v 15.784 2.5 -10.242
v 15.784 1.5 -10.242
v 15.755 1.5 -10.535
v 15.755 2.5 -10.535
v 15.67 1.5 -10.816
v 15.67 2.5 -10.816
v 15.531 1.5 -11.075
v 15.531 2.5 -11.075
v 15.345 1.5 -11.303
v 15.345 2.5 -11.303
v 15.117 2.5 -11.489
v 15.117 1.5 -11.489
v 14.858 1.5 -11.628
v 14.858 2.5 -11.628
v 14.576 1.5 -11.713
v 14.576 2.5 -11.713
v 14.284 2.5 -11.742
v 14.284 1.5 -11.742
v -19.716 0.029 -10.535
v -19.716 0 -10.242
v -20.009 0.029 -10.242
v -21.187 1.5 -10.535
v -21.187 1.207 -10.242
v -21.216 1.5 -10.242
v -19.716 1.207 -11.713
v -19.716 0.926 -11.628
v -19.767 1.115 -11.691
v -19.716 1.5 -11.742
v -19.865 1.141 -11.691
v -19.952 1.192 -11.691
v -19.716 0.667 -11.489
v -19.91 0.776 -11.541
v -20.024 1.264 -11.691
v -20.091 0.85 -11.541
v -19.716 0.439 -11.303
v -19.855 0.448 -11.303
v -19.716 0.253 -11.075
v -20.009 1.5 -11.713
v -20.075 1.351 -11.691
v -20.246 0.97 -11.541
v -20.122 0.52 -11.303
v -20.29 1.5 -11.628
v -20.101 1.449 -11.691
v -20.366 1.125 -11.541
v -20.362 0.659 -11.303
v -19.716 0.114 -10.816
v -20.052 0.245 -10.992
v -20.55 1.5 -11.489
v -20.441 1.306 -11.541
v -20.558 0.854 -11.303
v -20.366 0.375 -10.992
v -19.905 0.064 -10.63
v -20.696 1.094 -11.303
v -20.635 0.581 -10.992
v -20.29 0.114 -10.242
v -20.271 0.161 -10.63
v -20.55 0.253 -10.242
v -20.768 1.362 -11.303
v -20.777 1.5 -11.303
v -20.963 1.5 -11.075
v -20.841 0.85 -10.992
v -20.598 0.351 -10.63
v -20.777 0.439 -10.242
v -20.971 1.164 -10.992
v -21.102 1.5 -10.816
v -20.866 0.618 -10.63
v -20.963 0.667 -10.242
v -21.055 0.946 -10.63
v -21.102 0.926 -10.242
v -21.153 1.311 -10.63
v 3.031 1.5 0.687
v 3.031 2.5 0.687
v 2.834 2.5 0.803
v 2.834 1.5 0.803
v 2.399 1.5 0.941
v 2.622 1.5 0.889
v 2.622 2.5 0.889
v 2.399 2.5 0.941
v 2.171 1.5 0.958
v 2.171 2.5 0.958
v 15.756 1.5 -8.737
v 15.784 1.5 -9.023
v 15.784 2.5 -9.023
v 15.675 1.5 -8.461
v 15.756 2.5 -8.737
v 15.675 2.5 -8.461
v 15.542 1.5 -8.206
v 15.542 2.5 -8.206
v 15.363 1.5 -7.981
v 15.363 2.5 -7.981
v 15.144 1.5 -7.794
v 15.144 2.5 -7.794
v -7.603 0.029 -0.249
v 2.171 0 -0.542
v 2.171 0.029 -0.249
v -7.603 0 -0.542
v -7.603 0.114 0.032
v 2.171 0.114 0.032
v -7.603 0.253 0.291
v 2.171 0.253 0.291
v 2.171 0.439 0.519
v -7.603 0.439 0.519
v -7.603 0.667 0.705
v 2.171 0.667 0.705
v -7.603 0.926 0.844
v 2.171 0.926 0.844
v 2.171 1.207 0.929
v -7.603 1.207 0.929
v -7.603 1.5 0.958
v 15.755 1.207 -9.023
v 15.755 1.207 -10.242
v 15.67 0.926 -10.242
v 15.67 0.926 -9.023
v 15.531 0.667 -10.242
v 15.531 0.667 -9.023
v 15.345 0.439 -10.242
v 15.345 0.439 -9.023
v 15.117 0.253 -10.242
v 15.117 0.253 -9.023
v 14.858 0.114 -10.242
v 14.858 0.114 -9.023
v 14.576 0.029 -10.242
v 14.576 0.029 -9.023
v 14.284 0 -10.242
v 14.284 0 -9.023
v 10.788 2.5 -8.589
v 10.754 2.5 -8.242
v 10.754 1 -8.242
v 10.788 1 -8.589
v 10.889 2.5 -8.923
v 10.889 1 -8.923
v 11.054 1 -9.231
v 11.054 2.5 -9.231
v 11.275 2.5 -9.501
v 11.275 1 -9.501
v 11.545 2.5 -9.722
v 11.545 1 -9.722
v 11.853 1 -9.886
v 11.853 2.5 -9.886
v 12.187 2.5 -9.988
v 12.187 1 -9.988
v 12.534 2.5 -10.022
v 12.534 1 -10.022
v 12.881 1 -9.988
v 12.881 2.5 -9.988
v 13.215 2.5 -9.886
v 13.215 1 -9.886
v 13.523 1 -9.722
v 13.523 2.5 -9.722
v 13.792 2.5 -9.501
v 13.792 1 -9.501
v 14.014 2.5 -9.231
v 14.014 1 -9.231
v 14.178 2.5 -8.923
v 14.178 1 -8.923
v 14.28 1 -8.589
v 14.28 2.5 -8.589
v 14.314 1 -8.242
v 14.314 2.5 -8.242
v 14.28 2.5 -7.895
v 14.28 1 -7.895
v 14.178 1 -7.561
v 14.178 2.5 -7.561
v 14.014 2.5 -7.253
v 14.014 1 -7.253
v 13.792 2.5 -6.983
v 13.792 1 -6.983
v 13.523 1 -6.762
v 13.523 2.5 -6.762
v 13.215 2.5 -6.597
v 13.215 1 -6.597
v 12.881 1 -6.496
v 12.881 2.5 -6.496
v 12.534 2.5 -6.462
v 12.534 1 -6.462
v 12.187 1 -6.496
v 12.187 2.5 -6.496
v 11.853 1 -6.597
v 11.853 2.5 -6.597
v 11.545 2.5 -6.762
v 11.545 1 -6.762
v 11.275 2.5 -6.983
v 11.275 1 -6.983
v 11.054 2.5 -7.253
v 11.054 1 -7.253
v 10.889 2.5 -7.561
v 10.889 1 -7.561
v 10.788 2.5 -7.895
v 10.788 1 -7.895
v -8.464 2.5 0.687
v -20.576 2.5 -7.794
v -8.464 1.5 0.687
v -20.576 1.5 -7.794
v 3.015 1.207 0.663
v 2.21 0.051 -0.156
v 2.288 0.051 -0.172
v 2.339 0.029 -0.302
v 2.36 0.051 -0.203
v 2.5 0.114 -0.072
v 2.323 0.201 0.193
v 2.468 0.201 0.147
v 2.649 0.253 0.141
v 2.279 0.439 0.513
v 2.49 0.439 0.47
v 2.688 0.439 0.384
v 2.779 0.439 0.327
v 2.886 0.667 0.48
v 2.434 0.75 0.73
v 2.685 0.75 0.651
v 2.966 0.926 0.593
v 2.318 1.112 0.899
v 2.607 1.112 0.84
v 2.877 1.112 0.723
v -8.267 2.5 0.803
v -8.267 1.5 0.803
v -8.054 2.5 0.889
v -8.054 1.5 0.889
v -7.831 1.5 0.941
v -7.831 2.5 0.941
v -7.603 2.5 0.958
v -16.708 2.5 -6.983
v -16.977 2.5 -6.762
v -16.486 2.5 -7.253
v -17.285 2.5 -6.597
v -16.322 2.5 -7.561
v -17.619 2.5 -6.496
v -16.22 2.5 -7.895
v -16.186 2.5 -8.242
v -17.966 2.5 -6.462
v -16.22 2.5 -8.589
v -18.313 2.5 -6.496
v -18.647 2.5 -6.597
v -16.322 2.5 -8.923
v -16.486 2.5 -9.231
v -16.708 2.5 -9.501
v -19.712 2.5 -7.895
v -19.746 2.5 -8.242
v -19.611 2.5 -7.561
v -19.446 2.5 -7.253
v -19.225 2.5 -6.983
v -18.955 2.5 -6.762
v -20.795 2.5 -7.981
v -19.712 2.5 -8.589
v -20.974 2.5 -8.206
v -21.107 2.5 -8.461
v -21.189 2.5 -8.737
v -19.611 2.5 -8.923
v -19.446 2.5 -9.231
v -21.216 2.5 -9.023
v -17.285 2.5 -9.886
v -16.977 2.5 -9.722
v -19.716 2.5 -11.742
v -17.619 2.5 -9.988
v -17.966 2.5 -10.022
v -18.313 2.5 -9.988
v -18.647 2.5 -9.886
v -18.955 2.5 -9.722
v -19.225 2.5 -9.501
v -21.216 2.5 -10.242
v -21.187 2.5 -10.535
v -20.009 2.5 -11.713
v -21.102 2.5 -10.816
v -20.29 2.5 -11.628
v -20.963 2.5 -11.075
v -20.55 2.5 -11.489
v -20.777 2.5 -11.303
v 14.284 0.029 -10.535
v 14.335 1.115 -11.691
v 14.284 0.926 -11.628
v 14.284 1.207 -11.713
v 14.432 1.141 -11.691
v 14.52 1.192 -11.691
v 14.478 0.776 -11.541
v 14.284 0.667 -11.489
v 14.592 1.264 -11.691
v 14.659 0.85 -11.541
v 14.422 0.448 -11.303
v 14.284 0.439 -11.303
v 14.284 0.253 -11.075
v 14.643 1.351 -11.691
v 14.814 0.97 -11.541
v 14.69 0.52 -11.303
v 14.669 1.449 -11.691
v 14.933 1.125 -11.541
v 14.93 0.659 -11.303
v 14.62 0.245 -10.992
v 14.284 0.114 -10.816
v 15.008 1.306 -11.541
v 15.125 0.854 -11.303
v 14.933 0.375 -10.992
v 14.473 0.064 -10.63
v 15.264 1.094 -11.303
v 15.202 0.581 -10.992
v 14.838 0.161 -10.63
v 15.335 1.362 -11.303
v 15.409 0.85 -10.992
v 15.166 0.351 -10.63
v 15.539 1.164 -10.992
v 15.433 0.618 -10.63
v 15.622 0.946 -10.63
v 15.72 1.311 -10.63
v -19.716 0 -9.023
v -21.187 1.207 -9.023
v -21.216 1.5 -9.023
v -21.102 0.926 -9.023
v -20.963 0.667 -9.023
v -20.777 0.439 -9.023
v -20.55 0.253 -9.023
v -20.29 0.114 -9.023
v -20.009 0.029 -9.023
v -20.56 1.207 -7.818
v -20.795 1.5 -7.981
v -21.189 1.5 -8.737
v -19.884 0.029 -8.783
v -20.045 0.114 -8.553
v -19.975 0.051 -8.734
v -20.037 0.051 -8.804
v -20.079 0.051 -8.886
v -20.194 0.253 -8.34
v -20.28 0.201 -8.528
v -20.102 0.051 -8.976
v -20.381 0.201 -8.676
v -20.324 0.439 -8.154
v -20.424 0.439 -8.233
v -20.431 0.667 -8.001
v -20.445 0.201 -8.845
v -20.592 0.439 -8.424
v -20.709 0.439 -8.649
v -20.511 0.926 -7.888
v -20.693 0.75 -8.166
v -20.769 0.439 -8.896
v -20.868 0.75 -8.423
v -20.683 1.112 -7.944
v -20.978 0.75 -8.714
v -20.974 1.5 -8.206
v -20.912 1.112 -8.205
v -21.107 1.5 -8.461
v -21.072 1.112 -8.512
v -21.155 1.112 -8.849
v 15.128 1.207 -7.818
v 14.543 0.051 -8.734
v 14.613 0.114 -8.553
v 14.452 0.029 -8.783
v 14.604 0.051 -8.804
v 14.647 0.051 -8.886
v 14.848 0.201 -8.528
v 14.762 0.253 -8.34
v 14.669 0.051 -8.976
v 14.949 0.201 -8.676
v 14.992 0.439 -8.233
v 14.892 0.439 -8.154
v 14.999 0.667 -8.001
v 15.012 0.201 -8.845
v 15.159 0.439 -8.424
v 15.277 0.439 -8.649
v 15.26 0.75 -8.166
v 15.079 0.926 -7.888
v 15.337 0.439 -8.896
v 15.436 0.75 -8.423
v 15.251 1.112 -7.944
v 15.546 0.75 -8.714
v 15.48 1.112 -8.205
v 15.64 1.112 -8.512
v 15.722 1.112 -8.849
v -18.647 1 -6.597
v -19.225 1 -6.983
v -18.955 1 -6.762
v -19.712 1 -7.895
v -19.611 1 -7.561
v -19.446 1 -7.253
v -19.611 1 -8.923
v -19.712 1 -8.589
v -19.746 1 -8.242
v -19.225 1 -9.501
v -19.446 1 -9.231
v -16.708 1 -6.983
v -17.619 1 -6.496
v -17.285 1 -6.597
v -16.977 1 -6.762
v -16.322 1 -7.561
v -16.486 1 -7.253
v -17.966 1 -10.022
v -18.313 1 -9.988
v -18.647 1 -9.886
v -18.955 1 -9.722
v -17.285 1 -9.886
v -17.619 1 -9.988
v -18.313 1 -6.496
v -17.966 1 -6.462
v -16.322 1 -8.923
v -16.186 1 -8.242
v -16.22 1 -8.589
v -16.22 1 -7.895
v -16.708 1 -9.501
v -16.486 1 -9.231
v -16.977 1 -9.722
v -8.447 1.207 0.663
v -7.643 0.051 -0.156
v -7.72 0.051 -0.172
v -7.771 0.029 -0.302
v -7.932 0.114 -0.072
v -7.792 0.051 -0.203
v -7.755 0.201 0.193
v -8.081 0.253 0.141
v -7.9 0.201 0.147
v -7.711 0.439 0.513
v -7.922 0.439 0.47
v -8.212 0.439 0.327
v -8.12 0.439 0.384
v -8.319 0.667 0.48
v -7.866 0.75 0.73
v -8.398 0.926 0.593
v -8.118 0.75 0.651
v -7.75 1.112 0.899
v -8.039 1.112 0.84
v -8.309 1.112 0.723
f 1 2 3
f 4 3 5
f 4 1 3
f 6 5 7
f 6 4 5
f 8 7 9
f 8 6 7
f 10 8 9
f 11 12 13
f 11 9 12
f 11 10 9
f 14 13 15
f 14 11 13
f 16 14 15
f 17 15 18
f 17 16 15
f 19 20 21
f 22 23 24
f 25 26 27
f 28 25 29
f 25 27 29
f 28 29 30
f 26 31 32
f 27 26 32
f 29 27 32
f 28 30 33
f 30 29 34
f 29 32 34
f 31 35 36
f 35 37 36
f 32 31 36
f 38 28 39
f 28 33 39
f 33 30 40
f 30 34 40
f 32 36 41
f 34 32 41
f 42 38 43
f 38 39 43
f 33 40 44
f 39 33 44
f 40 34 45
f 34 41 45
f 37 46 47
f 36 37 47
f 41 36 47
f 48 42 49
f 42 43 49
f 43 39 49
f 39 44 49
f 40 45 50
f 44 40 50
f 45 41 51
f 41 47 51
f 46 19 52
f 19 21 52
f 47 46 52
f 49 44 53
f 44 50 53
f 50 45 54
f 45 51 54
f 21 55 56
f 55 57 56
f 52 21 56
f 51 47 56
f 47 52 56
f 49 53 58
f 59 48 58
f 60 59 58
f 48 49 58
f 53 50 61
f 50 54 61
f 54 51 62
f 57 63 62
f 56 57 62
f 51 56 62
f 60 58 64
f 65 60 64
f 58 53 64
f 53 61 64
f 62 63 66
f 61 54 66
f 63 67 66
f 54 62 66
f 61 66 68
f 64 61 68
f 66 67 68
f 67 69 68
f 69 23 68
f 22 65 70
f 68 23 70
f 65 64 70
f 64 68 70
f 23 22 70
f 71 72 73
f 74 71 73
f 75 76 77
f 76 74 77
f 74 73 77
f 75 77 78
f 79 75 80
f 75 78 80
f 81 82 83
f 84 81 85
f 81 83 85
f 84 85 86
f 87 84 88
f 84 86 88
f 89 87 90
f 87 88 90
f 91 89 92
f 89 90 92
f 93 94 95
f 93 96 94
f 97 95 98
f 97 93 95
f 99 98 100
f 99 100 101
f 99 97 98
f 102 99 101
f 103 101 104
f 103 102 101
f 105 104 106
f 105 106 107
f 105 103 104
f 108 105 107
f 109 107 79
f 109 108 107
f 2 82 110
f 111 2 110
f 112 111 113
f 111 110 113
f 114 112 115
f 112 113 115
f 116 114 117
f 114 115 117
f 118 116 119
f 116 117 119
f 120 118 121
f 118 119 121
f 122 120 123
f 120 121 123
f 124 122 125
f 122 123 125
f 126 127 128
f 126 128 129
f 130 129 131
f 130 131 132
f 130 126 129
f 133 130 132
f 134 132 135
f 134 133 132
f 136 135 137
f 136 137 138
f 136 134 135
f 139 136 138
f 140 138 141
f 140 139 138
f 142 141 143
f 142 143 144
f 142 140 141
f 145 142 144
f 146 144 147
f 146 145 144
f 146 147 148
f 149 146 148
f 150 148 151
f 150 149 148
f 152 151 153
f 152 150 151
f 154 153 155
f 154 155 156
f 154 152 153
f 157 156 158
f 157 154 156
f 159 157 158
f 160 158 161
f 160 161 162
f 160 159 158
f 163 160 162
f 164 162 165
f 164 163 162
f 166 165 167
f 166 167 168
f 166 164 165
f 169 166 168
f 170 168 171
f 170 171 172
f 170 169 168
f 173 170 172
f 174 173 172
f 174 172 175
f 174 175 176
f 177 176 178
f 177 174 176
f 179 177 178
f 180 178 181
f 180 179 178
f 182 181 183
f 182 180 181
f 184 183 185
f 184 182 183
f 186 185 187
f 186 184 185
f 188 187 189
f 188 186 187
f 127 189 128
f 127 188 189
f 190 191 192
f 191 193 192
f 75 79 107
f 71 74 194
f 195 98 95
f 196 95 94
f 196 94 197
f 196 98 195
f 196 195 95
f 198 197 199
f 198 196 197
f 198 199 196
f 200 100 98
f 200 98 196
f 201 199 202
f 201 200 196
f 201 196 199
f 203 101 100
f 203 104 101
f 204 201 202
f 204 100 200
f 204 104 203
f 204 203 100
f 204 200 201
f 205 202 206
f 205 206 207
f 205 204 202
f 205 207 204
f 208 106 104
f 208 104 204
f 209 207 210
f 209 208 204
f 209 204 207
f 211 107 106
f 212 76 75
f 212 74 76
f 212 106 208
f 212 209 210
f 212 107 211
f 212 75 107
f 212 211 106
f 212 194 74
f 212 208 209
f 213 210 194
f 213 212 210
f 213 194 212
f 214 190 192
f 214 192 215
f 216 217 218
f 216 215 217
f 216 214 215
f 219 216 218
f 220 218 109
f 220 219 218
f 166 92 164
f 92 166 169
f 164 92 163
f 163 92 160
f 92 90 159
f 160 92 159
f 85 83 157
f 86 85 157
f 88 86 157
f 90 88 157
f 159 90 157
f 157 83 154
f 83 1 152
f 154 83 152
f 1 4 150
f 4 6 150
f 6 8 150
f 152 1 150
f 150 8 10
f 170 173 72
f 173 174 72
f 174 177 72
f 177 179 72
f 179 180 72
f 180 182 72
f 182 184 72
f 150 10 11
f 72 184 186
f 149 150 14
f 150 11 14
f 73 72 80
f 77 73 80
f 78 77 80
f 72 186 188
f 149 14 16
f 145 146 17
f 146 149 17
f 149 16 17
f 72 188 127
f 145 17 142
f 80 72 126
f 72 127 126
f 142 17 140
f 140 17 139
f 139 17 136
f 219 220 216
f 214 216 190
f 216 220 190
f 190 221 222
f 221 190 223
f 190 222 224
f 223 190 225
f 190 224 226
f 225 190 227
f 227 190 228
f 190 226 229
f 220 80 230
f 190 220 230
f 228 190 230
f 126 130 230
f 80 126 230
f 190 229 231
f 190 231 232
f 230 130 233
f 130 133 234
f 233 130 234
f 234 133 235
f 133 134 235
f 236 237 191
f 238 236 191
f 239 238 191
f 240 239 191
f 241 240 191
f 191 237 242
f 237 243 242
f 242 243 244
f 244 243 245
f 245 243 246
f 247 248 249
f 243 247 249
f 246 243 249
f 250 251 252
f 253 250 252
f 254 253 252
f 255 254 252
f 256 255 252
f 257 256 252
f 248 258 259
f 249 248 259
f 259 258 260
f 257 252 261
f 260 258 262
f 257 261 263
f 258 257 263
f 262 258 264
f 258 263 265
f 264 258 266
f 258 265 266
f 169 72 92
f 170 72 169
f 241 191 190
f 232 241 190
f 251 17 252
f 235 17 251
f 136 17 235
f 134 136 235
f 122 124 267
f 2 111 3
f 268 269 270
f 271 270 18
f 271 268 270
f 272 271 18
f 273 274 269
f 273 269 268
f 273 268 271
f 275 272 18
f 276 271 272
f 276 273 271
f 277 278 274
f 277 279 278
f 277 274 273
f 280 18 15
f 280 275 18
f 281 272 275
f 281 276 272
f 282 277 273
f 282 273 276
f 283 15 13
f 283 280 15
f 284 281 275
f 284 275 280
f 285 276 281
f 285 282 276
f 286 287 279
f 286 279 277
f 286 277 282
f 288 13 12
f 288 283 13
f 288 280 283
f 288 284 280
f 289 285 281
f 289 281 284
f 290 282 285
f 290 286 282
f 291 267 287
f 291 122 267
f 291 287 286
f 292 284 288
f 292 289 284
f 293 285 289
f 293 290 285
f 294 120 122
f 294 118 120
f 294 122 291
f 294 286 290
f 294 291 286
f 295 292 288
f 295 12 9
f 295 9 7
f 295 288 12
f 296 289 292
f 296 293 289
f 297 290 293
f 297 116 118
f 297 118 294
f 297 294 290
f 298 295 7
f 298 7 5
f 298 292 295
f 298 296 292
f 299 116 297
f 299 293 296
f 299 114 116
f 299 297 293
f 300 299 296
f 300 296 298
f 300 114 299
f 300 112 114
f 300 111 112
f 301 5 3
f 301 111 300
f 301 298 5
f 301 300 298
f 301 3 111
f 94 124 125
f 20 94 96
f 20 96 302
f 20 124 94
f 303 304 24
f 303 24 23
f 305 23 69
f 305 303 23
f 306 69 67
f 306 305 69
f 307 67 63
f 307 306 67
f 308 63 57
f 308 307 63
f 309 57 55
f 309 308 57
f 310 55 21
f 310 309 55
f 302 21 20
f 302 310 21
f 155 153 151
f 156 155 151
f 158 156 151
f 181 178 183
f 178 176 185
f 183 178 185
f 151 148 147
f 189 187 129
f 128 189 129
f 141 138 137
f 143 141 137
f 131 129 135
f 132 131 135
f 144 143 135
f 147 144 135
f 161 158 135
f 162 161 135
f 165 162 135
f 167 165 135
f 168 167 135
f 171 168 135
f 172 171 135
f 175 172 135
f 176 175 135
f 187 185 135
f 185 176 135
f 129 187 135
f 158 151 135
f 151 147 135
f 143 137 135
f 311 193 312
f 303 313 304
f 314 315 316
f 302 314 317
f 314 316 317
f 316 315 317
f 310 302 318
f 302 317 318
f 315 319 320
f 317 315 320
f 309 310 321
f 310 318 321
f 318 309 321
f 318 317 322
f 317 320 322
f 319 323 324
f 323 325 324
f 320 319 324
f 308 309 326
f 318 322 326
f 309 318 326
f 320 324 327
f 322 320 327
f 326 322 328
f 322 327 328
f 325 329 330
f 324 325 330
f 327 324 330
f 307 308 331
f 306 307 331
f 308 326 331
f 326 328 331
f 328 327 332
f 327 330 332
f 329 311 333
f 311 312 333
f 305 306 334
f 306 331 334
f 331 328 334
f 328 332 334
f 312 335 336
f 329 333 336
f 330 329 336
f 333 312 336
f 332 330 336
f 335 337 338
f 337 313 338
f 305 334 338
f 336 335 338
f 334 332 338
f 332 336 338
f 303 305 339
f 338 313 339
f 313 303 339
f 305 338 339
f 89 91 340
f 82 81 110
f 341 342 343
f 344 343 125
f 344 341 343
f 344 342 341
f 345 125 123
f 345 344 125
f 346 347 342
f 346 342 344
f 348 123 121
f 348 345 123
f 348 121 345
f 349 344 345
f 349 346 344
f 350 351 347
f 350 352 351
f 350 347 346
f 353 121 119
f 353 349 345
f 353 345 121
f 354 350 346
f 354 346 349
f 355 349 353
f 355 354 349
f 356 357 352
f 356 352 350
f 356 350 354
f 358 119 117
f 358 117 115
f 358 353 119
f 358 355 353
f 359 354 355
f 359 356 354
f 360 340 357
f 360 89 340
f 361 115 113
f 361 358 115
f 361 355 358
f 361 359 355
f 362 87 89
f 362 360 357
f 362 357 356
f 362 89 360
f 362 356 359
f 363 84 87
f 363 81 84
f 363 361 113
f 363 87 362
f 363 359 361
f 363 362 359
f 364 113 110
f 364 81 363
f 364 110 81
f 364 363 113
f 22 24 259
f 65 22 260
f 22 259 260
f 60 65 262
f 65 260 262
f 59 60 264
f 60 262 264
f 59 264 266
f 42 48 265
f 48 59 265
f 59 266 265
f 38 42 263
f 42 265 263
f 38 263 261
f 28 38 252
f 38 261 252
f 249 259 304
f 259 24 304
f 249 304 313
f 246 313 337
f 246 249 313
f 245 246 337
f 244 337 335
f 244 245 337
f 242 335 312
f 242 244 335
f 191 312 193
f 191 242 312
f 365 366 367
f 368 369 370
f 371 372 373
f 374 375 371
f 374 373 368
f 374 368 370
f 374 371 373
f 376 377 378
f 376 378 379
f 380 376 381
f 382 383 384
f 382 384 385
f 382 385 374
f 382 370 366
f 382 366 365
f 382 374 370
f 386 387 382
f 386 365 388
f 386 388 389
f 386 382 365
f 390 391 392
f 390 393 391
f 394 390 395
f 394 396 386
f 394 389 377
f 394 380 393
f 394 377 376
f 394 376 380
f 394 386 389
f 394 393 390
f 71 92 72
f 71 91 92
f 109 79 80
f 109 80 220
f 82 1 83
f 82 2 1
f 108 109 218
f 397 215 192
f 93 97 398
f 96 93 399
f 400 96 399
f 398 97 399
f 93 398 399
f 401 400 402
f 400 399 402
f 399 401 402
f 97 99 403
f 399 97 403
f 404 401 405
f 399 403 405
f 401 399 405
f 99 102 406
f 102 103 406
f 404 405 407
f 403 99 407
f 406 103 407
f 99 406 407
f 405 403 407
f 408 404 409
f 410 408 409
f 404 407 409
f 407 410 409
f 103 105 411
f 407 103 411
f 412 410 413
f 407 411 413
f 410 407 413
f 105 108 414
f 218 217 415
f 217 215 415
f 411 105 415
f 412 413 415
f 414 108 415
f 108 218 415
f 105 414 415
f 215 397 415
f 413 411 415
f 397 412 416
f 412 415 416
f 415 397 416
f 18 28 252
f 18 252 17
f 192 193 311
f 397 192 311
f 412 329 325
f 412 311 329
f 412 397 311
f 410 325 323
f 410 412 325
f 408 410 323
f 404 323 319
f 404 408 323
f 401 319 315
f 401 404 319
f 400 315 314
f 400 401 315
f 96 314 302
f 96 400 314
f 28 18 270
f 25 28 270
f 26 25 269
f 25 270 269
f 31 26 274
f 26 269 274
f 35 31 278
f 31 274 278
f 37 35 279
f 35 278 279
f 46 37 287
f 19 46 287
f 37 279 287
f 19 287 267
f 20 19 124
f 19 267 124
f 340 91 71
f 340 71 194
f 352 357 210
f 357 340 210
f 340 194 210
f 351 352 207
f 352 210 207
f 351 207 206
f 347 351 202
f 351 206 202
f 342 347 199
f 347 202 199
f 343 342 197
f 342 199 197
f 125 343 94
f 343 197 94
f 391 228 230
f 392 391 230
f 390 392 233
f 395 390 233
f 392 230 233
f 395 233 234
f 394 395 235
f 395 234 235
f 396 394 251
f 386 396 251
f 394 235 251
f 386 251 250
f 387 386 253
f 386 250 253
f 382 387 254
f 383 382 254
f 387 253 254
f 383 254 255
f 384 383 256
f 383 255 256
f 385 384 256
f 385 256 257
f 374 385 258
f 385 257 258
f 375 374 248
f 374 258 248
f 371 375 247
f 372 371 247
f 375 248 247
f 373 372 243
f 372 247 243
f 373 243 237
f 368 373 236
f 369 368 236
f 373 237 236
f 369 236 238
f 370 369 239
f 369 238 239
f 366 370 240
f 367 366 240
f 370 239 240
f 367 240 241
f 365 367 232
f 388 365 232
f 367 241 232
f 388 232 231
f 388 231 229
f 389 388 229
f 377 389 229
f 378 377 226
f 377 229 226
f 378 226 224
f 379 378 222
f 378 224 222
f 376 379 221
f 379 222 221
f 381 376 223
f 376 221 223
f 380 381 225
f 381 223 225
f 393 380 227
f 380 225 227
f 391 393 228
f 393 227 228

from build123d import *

# Parameters (mm, degrees)
BOSS_EXTRUDE1_DEPTH = 2.5
SKETCH2_R           = 1.78
CUT_EXTRUDE1_DEPTH  = 1.5
FILLET1_R           = 1.5


with BuildPart() as part:
    # Sketch1 → Boss-Extrude1 (new body)
    with BuildSketch(Plane(origin=(0, 0, 0), x_dir=(1, 0, 0), z_dir=(0, 1, 0))):
        Polygon((-21.216153836, 11.741903429), (-21.216153836, 8.241903429), (-8.076153836, -0.958096571), (-2.716153836, -0.958096571), (-2.716153836, 11.741903429), align=None)
    extrude(amount=BOSS_EXTRUDE1_DEPTH)

    # Sketch2 → Cut-Extrude1 (cut)
    with BuildSketch(Plane(origin=(0, 2.5, 0), x_dir=(1, 0, 0), z_dir=(0, 1, 0))):
        with Locations((-17.966153836, 8.241903429)):
            Circle(SKETCH2_R)
    extrude(amount=-CUT_EXTRUDE1_DEPTH, mode=Mode.SUBTRACT)

    # Fillet1
    fillet1_edges = [part.edges().sort_by_distance(p)[0] for p in [
        (-5.396153836, 0, 0.958096571),
        (-14.646153836, 0, -3.641903429),
        (-21.216153836, 0, -9.991903429),
        (-11.966153836, 0, -11.741903429),
        (-8.076153836, 1.25, 0.958096571),
        (-21.216153836, 1.25, -8.241903429),
        (-21.216153836, 1.25, -11.741903429),
    ]]
    fillet(fillet1_edges, radius=FILLET1_R)

    # Mirror1: part across plane


with BuildPart() as part_1:
    add(part.part)
    add(part.part.mirror(Plane(origin=(-2.716153836, 2.5, 0.958096571), x_dir=(0, 0, 1), z_dir=(-1, 0, 0))))


solid = part_1.part
